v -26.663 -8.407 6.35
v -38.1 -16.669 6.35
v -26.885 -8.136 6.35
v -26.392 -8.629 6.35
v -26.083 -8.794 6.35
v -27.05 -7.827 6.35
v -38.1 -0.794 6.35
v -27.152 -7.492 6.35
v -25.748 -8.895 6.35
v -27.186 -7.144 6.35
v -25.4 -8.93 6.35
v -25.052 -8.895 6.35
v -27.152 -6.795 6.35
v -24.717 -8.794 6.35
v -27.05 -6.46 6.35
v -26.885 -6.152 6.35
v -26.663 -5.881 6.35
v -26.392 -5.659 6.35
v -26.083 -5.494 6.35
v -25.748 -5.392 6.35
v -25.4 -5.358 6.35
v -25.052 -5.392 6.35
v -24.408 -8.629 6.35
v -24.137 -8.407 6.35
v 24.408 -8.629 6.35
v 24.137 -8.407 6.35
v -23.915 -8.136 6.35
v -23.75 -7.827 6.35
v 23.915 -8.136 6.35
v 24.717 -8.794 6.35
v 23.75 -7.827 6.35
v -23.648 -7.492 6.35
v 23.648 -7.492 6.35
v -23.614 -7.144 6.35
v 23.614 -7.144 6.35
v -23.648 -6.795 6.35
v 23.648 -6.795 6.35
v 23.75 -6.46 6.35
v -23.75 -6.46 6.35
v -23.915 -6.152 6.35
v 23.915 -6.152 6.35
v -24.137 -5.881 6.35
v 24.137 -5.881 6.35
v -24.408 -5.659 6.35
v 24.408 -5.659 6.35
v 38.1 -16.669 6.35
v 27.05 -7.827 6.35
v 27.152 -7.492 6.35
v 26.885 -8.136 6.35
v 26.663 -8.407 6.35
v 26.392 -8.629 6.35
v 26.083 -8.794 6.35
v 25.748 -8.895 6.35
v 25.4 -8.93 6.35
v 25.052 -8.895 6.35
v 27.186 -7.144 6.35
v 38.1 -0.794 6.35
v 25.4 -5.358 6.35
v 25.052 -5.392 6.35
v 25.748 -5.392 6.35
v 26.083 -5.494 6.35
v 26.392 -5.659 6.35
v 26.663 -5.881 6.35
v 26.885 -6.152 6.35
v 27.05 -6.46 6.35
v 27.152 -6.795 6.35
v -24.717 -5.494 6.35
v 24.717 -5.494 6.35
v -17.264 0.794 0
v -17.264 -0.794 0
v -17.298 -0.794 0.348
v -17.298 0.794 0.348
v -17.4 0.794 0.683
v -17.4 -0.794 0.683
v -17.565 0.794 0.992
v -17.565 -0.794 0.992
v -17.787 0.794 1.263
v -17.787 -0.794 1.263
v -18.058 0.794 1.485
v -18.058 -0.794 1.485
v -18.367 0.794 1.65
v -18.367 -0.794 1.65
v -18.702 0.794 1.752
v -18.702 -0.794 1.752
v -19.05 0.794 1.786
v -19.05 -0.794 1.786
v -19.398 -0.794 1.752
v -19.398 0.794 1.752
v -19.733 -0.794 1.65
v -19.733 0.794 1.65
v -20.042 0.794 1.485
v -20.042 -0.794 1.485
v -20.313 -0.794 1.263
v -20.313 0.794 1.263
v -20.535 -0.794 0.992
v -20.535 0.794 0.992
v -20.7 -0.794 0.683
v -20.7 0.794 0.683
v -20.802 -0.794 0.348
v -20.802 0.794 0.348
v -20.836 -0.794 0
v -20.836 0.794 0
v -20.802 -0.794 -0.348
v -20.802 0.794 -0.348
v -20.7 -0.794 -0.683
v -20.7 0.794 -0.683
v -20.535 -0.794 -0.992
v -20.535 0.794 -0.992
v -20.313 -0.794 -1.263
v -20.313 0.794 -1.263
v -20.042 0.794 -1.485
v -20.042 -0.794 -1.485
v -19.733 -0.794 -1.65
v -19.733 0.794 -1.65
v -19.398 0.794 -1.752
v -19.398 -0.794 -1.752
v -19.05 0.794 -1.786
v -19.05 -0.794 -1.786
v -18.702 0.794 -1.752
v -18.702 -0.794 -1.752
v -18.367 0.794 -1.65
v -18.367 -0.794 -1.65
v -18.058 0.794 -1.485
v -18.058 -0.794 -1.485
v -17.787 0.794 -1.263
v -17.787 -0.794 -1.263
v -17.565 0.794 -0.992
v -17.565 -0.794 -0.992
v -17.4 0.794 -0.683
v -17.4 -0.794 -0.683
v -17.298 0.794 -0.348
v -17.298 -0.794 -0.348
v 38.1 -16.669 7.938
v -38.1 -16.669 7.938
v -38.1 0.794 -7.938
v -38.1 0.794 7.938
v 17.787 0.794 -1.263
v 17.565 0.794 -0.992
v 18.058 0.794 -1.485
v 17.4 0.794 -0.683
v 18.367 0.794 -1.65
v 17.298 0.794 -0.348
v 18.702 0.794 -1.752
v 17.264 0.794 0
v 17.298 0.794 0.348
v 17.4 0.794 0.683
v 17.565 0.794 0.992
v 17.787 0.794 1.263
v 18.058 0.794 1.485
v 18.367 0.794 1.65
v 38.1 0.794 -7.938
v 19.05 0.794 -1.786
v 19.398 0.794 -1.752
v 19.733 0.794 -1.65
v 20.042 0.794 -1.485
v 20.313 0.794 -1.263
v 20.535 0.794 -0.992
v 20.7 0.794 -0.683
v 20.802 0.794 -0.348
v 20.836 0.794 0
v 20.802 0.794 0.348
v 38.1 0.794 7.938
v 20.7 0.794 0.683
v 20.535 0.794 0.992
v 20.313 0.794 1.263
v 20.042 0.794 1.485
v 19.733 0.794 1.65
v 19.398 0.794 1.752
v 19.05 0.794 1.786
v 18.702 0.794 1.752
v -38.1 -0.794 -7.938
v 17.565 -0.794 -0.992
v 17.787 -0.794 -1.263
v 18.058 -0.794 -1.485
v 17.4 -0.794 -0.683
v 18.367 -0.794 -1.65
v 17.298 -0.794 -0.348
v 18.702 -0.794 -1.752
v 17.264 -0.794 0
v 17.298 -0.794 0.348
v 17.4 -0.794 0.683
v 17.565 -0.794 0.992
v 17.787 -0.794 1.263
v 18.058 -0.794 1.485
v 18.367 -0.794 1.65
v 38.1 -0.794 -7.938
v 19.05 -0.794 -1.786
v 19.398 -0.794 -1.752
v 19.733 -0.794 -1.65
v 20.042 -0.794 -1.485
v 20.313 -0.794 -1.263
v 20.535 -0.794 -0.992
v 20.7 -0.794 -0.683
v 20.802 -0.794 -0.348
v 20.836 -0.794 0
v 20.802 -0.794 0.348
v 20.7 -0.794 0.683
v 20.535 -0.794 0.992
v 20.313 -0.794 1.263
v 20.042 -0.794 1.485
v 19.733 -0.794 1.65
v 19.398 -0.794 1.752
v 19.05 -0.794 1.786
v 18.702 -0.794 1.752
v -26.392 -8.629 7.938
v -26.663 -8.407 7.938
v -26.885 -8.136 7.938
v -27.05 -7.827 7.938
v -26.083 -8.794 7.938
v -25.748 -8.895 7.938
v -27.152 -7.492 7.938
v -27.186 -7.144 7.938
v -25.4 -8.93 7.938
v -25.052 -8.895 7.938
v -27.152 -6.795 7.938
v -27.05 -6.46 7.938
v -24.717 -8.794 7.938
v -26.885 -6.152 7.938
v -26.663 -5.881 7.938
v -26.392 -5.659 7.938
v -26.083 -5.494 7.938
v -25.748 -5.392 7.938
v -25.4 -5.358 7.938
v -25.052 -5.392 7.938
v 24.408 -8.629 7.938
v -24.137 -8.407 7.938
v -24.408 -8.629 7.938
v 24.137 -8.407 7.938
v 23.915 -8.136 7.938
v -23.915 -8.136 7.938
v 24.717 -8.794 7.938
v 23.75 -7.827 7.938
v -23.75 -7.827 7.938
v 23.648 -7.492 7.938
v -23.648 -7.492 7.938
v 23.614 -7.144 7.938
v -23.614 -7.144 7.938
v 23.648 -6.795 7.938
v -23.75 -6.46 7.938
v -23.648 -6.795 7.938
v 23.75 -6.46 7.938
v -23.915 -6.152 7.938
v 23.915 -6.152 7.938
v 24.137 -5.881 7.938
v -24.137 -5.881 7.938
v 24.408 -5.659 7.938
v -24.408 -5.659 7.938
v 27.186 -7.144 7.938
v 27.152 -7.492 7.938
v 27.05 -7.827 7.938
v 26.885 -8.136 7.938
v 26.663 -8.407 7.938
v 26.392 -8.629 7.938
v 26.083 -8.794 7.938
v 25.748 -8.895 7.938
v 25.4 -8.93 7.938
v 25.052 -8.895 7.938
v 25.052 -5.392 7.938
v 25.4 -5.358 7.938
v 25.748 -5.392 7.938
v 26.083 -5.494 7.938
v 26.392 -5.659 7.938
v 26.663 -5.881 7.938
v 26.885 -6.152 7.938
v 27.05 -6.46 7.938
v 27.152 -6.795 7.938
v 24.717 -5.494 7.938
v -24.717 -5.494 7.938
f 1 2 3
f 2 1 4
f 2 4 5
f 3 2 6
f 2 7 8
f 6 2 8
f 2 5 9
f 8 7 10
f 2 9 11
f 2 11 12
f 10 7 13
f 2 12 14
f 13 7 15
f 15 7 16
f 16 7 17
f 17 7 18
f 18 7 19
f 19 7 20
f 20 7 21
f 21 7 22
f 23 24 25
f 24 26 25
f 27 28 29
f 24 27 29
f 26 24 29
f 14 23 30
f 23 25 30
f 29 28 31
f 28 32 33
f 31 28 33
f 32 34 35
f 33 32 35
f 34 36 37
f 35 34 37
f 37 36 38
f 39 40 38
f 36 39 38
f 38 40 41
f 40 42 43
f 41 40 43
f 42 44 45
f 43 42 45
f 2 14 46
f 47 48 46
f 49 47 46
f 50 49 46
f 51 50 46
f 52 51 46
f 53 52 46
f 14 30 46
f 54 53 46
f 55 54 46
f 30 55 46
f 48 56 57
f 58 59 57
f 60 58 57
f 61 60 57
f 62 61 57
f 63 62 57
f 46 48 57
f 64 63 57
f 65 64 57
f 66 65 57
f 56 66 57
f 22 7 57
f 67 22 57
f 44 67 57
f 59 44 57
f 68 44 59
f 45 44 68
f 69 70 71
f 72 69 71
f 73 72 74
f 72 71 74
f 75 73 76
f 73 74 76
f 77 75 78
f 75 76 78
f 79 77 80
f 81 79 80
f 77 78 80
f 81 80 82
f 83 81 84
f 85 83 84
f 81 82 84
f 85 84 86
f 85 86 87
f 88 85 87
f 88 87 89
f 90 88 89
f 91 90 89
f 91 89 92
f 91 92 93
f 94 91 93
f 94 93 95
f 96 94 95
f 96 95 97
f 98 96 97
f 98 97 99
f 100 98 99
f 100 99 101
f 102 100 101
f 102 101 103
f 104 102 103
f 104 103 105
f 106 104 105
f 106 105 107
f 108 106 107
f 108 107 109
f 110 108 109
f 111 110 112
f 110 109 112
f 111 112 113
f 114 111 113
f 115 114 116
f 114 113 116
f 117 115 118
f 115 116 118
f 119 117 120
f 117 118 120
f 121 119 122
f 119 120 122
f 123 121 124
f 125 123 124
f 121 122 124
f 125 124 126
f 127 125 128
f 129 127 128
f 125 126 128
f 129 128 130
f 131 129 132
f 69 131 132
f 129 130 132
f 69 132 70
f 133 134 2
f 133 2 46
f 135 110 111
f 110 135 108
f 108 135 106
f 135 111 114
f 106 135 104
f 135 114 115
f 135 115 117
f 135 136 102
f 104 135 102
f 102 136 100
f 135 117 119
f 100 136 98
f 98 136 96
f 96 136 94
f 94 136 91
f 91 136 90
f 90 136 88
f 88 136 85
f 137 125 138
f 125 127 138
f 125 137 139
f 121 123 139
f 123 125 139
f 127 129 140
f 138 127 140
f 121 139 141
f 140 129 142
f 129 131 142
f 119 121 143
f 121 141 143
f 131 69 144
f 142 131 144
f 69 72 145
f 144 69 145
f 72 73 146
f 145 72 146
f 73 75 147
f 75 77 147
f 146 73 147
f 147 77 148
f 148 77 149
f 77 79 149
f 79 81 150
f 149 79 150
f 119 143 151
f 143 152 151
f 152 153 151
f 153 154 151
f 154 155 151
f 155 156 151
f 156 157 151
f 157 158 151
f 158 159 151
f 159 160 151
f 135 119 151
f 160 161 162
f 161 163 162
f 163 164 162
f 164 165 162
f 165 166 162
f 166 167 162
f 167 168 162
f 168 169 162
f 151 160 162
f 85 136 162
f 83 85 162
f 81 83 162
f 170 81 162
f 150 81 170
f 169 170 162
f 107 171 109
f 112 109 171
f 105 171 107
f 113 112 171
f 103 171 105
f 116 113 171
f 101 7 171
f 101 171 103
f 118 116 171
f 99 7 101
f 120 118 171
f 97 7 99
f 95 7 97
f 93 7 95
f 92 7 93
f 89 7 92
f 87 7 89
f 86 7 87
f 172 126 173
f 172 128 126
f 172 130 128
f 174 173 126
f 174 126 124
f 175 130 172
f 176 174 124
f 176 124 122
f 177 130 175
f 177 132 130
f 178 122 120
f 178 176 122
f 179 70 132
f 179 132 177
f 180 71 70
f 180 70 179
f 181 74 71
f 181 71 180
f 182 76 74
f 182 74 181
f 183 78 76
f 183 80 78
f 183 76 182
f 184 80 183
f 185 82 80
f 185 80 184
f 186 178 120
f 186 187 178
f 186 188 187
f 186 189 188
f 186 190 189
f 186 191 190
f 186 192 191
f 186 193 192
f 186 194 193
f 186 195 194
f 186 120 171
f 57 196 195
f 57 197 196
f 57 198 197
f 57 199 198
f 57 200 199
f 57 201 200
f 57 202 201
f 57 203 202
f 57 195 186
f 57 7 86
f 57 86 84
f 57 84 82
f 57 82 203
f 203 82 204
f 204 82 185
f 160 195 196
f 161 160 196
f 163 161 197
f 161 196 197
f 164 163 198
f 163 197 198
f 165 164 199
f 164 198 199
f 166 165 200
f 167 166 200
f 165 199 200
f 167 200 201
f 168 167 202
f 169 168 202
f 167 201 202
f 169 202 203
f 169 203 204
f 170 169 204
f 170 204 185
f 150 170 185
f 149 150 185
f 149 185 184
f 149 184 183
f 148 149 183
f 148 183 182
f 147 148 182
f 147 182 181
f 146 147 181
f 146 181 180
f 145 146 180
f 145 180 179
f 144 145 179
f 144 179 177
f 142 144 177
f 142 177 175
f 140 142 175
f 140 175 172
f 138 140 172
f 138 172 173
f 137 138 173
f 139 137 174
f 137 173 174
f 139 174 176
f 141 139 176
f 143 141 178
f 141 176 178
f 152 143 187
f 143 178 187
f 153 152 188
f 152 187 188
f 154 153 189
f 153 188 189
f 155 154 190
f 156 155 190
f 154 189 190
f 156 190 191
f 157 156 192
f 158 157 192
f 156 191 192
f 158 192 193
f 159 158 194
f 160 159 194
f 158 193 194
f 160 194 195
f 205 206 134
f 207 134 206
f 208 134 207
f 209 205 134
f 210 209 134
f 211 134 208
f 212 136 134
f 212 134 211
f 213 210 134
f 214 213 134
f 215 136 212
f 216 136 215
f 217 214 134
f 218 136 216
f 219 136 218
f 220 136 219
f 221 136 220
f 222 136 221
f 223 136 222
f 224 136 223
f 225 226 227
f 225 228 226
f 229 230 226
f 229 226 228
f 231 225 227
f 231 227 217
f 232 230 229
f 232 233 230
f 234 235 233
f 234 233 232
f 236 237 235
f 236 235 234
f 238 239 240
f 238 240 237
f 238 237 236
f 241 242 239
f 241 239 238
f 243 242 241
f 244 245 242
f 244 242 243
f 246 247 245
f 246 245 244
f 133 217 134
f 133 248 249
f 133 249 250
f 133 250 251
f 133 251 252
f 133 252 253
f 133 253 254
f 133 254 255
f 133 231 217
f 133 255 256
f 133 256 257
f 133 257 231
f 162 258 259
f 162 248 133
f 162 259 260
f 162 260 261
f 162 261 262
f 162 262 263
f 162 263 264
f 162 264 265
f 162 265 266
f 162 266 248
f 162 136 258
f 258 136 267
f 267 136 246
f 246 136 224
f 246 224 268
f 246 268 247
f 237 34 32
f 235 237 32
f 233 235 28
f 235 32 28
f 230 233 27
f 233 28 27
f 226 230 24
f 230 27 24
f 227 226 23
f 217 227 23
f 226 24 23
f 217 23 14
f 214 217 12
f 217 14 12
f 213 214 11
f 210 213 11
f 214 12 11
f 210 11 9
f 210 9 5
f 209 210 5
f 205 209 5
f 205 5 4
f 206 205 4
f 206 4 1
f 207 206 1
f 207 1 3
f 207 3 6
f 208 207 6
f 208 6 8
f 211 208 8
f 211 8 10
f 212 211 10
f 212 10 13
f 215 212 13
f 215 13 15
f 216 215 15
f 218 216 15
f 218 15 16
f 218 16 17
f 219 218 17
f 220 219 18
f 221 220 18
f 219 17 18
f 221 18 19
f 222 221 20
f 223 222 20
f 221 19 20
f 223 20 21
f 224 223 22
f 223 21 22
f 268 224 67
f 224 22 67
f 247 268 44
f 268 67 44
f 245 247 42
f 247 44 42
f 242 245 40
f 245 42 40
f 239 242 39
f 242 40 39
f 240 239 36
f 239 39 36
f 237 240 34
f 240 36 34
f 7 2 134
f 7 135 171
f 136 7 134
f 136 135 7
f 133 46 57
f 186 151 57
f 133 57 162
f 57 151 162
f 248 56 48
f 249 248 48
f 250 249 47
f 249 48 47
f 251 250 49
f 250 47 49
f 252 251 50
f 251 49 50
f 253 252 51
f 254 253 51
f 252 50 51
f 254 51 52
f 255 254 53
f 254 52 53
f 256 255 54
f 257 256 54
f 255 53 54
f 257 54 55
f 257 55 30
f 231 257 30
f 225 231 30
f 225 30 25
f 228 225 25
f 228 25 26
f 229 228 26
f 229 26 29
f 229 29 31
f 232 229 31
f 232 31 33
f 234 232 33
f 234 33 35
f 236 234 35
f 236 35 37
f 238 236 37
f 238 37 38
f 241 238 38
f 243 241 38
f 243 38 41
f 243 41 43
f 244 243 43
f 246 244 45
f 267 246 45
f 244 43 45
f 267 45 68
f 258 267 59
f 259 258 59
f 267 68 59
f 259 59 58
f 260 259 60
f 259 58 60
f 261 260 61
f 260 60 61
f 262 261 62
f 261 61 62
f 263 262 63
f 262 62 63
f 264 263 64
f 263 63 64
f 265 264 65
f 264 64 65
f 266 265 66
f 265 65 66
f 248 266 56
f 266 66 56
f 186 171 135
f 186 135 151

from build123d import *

# Parameters (mm, degrees)
F0_W      = 76.2
F0_H      = 15.875
F1_DEPTH  = 0.79375
F2_R      = 1.7859375
F3_DEPTH  = 1.5885
F4_R      = 1.7859375
F5_DEPTH  = 1.5885
F6_W      = 76.2
F6_H      = 1.5875
F7_DEPTH  = 15.875
F8_R      = 1.7859375
F9_DEPTH  = 1.5885
F10_R     = 1.7859375
F11_DEPTH = 1.5885


with BuildPart() as f1:
    # F0 (on Front) → F1 (new body, symmetric)
    with BuildSketch(Plane.XZ):
        Rectangle(F0_W, F0_H)
    extrude(amount=F1_DEPTH, both=True)

    # F2 (on face) → F3 (cut, through all)
    with BuildSketch(Plane.XZ.offset(0.79375)):
        with Locations((-19.05, 0)):
            Circle(F2_R)
    extrude(amount=-F3_DEPTH, mode=Mode.SUBTRACT)

    # F4 (on face) → F5 (cut, through all)
    with BuildSketch(Plane.XZ.offset(0.79375)):
        with Locations((19.05, 0)):
            Circle(F4_R)
    extrude(amount=-F5_DEPTH, mode=Mode.SUBTRACT)

    # F6 (on face) → F7 (join)
    with BuildSketch(Plane.XZ.offset(0.79375)):
        with Locations((0, 7.14375)):
            Rectangle(F6_W, F6_H)
    extrude(amount=F7_DEPTH)

    # F8 (on face) → F9 (cut, through all)
    with BuildSketch(Plane(origin=(0, 0, 6.35), x_dir=(1, 0, 0), z_dir=(0, 0, -1))):
        with Locations((-25.4, 7.14375)):
            Circle(F8_R)
    extrude(amount=-F9_DEPTH, mode=Mode.SUBTRACT)

    # F10 (on face) → F11 (cut, through all)
    with BuildSketch(Plane(origin=(0, 0, 6.35), x_dir=(1, 0, 0), z_dir=(0, 0, -1))):
        with Locations((25.4, 7.14375)):
            Circle(F10_R)
    extrude(amount=-F11_DEPTH, mode=Mode.SUBTRACT)


solid = f1.part
